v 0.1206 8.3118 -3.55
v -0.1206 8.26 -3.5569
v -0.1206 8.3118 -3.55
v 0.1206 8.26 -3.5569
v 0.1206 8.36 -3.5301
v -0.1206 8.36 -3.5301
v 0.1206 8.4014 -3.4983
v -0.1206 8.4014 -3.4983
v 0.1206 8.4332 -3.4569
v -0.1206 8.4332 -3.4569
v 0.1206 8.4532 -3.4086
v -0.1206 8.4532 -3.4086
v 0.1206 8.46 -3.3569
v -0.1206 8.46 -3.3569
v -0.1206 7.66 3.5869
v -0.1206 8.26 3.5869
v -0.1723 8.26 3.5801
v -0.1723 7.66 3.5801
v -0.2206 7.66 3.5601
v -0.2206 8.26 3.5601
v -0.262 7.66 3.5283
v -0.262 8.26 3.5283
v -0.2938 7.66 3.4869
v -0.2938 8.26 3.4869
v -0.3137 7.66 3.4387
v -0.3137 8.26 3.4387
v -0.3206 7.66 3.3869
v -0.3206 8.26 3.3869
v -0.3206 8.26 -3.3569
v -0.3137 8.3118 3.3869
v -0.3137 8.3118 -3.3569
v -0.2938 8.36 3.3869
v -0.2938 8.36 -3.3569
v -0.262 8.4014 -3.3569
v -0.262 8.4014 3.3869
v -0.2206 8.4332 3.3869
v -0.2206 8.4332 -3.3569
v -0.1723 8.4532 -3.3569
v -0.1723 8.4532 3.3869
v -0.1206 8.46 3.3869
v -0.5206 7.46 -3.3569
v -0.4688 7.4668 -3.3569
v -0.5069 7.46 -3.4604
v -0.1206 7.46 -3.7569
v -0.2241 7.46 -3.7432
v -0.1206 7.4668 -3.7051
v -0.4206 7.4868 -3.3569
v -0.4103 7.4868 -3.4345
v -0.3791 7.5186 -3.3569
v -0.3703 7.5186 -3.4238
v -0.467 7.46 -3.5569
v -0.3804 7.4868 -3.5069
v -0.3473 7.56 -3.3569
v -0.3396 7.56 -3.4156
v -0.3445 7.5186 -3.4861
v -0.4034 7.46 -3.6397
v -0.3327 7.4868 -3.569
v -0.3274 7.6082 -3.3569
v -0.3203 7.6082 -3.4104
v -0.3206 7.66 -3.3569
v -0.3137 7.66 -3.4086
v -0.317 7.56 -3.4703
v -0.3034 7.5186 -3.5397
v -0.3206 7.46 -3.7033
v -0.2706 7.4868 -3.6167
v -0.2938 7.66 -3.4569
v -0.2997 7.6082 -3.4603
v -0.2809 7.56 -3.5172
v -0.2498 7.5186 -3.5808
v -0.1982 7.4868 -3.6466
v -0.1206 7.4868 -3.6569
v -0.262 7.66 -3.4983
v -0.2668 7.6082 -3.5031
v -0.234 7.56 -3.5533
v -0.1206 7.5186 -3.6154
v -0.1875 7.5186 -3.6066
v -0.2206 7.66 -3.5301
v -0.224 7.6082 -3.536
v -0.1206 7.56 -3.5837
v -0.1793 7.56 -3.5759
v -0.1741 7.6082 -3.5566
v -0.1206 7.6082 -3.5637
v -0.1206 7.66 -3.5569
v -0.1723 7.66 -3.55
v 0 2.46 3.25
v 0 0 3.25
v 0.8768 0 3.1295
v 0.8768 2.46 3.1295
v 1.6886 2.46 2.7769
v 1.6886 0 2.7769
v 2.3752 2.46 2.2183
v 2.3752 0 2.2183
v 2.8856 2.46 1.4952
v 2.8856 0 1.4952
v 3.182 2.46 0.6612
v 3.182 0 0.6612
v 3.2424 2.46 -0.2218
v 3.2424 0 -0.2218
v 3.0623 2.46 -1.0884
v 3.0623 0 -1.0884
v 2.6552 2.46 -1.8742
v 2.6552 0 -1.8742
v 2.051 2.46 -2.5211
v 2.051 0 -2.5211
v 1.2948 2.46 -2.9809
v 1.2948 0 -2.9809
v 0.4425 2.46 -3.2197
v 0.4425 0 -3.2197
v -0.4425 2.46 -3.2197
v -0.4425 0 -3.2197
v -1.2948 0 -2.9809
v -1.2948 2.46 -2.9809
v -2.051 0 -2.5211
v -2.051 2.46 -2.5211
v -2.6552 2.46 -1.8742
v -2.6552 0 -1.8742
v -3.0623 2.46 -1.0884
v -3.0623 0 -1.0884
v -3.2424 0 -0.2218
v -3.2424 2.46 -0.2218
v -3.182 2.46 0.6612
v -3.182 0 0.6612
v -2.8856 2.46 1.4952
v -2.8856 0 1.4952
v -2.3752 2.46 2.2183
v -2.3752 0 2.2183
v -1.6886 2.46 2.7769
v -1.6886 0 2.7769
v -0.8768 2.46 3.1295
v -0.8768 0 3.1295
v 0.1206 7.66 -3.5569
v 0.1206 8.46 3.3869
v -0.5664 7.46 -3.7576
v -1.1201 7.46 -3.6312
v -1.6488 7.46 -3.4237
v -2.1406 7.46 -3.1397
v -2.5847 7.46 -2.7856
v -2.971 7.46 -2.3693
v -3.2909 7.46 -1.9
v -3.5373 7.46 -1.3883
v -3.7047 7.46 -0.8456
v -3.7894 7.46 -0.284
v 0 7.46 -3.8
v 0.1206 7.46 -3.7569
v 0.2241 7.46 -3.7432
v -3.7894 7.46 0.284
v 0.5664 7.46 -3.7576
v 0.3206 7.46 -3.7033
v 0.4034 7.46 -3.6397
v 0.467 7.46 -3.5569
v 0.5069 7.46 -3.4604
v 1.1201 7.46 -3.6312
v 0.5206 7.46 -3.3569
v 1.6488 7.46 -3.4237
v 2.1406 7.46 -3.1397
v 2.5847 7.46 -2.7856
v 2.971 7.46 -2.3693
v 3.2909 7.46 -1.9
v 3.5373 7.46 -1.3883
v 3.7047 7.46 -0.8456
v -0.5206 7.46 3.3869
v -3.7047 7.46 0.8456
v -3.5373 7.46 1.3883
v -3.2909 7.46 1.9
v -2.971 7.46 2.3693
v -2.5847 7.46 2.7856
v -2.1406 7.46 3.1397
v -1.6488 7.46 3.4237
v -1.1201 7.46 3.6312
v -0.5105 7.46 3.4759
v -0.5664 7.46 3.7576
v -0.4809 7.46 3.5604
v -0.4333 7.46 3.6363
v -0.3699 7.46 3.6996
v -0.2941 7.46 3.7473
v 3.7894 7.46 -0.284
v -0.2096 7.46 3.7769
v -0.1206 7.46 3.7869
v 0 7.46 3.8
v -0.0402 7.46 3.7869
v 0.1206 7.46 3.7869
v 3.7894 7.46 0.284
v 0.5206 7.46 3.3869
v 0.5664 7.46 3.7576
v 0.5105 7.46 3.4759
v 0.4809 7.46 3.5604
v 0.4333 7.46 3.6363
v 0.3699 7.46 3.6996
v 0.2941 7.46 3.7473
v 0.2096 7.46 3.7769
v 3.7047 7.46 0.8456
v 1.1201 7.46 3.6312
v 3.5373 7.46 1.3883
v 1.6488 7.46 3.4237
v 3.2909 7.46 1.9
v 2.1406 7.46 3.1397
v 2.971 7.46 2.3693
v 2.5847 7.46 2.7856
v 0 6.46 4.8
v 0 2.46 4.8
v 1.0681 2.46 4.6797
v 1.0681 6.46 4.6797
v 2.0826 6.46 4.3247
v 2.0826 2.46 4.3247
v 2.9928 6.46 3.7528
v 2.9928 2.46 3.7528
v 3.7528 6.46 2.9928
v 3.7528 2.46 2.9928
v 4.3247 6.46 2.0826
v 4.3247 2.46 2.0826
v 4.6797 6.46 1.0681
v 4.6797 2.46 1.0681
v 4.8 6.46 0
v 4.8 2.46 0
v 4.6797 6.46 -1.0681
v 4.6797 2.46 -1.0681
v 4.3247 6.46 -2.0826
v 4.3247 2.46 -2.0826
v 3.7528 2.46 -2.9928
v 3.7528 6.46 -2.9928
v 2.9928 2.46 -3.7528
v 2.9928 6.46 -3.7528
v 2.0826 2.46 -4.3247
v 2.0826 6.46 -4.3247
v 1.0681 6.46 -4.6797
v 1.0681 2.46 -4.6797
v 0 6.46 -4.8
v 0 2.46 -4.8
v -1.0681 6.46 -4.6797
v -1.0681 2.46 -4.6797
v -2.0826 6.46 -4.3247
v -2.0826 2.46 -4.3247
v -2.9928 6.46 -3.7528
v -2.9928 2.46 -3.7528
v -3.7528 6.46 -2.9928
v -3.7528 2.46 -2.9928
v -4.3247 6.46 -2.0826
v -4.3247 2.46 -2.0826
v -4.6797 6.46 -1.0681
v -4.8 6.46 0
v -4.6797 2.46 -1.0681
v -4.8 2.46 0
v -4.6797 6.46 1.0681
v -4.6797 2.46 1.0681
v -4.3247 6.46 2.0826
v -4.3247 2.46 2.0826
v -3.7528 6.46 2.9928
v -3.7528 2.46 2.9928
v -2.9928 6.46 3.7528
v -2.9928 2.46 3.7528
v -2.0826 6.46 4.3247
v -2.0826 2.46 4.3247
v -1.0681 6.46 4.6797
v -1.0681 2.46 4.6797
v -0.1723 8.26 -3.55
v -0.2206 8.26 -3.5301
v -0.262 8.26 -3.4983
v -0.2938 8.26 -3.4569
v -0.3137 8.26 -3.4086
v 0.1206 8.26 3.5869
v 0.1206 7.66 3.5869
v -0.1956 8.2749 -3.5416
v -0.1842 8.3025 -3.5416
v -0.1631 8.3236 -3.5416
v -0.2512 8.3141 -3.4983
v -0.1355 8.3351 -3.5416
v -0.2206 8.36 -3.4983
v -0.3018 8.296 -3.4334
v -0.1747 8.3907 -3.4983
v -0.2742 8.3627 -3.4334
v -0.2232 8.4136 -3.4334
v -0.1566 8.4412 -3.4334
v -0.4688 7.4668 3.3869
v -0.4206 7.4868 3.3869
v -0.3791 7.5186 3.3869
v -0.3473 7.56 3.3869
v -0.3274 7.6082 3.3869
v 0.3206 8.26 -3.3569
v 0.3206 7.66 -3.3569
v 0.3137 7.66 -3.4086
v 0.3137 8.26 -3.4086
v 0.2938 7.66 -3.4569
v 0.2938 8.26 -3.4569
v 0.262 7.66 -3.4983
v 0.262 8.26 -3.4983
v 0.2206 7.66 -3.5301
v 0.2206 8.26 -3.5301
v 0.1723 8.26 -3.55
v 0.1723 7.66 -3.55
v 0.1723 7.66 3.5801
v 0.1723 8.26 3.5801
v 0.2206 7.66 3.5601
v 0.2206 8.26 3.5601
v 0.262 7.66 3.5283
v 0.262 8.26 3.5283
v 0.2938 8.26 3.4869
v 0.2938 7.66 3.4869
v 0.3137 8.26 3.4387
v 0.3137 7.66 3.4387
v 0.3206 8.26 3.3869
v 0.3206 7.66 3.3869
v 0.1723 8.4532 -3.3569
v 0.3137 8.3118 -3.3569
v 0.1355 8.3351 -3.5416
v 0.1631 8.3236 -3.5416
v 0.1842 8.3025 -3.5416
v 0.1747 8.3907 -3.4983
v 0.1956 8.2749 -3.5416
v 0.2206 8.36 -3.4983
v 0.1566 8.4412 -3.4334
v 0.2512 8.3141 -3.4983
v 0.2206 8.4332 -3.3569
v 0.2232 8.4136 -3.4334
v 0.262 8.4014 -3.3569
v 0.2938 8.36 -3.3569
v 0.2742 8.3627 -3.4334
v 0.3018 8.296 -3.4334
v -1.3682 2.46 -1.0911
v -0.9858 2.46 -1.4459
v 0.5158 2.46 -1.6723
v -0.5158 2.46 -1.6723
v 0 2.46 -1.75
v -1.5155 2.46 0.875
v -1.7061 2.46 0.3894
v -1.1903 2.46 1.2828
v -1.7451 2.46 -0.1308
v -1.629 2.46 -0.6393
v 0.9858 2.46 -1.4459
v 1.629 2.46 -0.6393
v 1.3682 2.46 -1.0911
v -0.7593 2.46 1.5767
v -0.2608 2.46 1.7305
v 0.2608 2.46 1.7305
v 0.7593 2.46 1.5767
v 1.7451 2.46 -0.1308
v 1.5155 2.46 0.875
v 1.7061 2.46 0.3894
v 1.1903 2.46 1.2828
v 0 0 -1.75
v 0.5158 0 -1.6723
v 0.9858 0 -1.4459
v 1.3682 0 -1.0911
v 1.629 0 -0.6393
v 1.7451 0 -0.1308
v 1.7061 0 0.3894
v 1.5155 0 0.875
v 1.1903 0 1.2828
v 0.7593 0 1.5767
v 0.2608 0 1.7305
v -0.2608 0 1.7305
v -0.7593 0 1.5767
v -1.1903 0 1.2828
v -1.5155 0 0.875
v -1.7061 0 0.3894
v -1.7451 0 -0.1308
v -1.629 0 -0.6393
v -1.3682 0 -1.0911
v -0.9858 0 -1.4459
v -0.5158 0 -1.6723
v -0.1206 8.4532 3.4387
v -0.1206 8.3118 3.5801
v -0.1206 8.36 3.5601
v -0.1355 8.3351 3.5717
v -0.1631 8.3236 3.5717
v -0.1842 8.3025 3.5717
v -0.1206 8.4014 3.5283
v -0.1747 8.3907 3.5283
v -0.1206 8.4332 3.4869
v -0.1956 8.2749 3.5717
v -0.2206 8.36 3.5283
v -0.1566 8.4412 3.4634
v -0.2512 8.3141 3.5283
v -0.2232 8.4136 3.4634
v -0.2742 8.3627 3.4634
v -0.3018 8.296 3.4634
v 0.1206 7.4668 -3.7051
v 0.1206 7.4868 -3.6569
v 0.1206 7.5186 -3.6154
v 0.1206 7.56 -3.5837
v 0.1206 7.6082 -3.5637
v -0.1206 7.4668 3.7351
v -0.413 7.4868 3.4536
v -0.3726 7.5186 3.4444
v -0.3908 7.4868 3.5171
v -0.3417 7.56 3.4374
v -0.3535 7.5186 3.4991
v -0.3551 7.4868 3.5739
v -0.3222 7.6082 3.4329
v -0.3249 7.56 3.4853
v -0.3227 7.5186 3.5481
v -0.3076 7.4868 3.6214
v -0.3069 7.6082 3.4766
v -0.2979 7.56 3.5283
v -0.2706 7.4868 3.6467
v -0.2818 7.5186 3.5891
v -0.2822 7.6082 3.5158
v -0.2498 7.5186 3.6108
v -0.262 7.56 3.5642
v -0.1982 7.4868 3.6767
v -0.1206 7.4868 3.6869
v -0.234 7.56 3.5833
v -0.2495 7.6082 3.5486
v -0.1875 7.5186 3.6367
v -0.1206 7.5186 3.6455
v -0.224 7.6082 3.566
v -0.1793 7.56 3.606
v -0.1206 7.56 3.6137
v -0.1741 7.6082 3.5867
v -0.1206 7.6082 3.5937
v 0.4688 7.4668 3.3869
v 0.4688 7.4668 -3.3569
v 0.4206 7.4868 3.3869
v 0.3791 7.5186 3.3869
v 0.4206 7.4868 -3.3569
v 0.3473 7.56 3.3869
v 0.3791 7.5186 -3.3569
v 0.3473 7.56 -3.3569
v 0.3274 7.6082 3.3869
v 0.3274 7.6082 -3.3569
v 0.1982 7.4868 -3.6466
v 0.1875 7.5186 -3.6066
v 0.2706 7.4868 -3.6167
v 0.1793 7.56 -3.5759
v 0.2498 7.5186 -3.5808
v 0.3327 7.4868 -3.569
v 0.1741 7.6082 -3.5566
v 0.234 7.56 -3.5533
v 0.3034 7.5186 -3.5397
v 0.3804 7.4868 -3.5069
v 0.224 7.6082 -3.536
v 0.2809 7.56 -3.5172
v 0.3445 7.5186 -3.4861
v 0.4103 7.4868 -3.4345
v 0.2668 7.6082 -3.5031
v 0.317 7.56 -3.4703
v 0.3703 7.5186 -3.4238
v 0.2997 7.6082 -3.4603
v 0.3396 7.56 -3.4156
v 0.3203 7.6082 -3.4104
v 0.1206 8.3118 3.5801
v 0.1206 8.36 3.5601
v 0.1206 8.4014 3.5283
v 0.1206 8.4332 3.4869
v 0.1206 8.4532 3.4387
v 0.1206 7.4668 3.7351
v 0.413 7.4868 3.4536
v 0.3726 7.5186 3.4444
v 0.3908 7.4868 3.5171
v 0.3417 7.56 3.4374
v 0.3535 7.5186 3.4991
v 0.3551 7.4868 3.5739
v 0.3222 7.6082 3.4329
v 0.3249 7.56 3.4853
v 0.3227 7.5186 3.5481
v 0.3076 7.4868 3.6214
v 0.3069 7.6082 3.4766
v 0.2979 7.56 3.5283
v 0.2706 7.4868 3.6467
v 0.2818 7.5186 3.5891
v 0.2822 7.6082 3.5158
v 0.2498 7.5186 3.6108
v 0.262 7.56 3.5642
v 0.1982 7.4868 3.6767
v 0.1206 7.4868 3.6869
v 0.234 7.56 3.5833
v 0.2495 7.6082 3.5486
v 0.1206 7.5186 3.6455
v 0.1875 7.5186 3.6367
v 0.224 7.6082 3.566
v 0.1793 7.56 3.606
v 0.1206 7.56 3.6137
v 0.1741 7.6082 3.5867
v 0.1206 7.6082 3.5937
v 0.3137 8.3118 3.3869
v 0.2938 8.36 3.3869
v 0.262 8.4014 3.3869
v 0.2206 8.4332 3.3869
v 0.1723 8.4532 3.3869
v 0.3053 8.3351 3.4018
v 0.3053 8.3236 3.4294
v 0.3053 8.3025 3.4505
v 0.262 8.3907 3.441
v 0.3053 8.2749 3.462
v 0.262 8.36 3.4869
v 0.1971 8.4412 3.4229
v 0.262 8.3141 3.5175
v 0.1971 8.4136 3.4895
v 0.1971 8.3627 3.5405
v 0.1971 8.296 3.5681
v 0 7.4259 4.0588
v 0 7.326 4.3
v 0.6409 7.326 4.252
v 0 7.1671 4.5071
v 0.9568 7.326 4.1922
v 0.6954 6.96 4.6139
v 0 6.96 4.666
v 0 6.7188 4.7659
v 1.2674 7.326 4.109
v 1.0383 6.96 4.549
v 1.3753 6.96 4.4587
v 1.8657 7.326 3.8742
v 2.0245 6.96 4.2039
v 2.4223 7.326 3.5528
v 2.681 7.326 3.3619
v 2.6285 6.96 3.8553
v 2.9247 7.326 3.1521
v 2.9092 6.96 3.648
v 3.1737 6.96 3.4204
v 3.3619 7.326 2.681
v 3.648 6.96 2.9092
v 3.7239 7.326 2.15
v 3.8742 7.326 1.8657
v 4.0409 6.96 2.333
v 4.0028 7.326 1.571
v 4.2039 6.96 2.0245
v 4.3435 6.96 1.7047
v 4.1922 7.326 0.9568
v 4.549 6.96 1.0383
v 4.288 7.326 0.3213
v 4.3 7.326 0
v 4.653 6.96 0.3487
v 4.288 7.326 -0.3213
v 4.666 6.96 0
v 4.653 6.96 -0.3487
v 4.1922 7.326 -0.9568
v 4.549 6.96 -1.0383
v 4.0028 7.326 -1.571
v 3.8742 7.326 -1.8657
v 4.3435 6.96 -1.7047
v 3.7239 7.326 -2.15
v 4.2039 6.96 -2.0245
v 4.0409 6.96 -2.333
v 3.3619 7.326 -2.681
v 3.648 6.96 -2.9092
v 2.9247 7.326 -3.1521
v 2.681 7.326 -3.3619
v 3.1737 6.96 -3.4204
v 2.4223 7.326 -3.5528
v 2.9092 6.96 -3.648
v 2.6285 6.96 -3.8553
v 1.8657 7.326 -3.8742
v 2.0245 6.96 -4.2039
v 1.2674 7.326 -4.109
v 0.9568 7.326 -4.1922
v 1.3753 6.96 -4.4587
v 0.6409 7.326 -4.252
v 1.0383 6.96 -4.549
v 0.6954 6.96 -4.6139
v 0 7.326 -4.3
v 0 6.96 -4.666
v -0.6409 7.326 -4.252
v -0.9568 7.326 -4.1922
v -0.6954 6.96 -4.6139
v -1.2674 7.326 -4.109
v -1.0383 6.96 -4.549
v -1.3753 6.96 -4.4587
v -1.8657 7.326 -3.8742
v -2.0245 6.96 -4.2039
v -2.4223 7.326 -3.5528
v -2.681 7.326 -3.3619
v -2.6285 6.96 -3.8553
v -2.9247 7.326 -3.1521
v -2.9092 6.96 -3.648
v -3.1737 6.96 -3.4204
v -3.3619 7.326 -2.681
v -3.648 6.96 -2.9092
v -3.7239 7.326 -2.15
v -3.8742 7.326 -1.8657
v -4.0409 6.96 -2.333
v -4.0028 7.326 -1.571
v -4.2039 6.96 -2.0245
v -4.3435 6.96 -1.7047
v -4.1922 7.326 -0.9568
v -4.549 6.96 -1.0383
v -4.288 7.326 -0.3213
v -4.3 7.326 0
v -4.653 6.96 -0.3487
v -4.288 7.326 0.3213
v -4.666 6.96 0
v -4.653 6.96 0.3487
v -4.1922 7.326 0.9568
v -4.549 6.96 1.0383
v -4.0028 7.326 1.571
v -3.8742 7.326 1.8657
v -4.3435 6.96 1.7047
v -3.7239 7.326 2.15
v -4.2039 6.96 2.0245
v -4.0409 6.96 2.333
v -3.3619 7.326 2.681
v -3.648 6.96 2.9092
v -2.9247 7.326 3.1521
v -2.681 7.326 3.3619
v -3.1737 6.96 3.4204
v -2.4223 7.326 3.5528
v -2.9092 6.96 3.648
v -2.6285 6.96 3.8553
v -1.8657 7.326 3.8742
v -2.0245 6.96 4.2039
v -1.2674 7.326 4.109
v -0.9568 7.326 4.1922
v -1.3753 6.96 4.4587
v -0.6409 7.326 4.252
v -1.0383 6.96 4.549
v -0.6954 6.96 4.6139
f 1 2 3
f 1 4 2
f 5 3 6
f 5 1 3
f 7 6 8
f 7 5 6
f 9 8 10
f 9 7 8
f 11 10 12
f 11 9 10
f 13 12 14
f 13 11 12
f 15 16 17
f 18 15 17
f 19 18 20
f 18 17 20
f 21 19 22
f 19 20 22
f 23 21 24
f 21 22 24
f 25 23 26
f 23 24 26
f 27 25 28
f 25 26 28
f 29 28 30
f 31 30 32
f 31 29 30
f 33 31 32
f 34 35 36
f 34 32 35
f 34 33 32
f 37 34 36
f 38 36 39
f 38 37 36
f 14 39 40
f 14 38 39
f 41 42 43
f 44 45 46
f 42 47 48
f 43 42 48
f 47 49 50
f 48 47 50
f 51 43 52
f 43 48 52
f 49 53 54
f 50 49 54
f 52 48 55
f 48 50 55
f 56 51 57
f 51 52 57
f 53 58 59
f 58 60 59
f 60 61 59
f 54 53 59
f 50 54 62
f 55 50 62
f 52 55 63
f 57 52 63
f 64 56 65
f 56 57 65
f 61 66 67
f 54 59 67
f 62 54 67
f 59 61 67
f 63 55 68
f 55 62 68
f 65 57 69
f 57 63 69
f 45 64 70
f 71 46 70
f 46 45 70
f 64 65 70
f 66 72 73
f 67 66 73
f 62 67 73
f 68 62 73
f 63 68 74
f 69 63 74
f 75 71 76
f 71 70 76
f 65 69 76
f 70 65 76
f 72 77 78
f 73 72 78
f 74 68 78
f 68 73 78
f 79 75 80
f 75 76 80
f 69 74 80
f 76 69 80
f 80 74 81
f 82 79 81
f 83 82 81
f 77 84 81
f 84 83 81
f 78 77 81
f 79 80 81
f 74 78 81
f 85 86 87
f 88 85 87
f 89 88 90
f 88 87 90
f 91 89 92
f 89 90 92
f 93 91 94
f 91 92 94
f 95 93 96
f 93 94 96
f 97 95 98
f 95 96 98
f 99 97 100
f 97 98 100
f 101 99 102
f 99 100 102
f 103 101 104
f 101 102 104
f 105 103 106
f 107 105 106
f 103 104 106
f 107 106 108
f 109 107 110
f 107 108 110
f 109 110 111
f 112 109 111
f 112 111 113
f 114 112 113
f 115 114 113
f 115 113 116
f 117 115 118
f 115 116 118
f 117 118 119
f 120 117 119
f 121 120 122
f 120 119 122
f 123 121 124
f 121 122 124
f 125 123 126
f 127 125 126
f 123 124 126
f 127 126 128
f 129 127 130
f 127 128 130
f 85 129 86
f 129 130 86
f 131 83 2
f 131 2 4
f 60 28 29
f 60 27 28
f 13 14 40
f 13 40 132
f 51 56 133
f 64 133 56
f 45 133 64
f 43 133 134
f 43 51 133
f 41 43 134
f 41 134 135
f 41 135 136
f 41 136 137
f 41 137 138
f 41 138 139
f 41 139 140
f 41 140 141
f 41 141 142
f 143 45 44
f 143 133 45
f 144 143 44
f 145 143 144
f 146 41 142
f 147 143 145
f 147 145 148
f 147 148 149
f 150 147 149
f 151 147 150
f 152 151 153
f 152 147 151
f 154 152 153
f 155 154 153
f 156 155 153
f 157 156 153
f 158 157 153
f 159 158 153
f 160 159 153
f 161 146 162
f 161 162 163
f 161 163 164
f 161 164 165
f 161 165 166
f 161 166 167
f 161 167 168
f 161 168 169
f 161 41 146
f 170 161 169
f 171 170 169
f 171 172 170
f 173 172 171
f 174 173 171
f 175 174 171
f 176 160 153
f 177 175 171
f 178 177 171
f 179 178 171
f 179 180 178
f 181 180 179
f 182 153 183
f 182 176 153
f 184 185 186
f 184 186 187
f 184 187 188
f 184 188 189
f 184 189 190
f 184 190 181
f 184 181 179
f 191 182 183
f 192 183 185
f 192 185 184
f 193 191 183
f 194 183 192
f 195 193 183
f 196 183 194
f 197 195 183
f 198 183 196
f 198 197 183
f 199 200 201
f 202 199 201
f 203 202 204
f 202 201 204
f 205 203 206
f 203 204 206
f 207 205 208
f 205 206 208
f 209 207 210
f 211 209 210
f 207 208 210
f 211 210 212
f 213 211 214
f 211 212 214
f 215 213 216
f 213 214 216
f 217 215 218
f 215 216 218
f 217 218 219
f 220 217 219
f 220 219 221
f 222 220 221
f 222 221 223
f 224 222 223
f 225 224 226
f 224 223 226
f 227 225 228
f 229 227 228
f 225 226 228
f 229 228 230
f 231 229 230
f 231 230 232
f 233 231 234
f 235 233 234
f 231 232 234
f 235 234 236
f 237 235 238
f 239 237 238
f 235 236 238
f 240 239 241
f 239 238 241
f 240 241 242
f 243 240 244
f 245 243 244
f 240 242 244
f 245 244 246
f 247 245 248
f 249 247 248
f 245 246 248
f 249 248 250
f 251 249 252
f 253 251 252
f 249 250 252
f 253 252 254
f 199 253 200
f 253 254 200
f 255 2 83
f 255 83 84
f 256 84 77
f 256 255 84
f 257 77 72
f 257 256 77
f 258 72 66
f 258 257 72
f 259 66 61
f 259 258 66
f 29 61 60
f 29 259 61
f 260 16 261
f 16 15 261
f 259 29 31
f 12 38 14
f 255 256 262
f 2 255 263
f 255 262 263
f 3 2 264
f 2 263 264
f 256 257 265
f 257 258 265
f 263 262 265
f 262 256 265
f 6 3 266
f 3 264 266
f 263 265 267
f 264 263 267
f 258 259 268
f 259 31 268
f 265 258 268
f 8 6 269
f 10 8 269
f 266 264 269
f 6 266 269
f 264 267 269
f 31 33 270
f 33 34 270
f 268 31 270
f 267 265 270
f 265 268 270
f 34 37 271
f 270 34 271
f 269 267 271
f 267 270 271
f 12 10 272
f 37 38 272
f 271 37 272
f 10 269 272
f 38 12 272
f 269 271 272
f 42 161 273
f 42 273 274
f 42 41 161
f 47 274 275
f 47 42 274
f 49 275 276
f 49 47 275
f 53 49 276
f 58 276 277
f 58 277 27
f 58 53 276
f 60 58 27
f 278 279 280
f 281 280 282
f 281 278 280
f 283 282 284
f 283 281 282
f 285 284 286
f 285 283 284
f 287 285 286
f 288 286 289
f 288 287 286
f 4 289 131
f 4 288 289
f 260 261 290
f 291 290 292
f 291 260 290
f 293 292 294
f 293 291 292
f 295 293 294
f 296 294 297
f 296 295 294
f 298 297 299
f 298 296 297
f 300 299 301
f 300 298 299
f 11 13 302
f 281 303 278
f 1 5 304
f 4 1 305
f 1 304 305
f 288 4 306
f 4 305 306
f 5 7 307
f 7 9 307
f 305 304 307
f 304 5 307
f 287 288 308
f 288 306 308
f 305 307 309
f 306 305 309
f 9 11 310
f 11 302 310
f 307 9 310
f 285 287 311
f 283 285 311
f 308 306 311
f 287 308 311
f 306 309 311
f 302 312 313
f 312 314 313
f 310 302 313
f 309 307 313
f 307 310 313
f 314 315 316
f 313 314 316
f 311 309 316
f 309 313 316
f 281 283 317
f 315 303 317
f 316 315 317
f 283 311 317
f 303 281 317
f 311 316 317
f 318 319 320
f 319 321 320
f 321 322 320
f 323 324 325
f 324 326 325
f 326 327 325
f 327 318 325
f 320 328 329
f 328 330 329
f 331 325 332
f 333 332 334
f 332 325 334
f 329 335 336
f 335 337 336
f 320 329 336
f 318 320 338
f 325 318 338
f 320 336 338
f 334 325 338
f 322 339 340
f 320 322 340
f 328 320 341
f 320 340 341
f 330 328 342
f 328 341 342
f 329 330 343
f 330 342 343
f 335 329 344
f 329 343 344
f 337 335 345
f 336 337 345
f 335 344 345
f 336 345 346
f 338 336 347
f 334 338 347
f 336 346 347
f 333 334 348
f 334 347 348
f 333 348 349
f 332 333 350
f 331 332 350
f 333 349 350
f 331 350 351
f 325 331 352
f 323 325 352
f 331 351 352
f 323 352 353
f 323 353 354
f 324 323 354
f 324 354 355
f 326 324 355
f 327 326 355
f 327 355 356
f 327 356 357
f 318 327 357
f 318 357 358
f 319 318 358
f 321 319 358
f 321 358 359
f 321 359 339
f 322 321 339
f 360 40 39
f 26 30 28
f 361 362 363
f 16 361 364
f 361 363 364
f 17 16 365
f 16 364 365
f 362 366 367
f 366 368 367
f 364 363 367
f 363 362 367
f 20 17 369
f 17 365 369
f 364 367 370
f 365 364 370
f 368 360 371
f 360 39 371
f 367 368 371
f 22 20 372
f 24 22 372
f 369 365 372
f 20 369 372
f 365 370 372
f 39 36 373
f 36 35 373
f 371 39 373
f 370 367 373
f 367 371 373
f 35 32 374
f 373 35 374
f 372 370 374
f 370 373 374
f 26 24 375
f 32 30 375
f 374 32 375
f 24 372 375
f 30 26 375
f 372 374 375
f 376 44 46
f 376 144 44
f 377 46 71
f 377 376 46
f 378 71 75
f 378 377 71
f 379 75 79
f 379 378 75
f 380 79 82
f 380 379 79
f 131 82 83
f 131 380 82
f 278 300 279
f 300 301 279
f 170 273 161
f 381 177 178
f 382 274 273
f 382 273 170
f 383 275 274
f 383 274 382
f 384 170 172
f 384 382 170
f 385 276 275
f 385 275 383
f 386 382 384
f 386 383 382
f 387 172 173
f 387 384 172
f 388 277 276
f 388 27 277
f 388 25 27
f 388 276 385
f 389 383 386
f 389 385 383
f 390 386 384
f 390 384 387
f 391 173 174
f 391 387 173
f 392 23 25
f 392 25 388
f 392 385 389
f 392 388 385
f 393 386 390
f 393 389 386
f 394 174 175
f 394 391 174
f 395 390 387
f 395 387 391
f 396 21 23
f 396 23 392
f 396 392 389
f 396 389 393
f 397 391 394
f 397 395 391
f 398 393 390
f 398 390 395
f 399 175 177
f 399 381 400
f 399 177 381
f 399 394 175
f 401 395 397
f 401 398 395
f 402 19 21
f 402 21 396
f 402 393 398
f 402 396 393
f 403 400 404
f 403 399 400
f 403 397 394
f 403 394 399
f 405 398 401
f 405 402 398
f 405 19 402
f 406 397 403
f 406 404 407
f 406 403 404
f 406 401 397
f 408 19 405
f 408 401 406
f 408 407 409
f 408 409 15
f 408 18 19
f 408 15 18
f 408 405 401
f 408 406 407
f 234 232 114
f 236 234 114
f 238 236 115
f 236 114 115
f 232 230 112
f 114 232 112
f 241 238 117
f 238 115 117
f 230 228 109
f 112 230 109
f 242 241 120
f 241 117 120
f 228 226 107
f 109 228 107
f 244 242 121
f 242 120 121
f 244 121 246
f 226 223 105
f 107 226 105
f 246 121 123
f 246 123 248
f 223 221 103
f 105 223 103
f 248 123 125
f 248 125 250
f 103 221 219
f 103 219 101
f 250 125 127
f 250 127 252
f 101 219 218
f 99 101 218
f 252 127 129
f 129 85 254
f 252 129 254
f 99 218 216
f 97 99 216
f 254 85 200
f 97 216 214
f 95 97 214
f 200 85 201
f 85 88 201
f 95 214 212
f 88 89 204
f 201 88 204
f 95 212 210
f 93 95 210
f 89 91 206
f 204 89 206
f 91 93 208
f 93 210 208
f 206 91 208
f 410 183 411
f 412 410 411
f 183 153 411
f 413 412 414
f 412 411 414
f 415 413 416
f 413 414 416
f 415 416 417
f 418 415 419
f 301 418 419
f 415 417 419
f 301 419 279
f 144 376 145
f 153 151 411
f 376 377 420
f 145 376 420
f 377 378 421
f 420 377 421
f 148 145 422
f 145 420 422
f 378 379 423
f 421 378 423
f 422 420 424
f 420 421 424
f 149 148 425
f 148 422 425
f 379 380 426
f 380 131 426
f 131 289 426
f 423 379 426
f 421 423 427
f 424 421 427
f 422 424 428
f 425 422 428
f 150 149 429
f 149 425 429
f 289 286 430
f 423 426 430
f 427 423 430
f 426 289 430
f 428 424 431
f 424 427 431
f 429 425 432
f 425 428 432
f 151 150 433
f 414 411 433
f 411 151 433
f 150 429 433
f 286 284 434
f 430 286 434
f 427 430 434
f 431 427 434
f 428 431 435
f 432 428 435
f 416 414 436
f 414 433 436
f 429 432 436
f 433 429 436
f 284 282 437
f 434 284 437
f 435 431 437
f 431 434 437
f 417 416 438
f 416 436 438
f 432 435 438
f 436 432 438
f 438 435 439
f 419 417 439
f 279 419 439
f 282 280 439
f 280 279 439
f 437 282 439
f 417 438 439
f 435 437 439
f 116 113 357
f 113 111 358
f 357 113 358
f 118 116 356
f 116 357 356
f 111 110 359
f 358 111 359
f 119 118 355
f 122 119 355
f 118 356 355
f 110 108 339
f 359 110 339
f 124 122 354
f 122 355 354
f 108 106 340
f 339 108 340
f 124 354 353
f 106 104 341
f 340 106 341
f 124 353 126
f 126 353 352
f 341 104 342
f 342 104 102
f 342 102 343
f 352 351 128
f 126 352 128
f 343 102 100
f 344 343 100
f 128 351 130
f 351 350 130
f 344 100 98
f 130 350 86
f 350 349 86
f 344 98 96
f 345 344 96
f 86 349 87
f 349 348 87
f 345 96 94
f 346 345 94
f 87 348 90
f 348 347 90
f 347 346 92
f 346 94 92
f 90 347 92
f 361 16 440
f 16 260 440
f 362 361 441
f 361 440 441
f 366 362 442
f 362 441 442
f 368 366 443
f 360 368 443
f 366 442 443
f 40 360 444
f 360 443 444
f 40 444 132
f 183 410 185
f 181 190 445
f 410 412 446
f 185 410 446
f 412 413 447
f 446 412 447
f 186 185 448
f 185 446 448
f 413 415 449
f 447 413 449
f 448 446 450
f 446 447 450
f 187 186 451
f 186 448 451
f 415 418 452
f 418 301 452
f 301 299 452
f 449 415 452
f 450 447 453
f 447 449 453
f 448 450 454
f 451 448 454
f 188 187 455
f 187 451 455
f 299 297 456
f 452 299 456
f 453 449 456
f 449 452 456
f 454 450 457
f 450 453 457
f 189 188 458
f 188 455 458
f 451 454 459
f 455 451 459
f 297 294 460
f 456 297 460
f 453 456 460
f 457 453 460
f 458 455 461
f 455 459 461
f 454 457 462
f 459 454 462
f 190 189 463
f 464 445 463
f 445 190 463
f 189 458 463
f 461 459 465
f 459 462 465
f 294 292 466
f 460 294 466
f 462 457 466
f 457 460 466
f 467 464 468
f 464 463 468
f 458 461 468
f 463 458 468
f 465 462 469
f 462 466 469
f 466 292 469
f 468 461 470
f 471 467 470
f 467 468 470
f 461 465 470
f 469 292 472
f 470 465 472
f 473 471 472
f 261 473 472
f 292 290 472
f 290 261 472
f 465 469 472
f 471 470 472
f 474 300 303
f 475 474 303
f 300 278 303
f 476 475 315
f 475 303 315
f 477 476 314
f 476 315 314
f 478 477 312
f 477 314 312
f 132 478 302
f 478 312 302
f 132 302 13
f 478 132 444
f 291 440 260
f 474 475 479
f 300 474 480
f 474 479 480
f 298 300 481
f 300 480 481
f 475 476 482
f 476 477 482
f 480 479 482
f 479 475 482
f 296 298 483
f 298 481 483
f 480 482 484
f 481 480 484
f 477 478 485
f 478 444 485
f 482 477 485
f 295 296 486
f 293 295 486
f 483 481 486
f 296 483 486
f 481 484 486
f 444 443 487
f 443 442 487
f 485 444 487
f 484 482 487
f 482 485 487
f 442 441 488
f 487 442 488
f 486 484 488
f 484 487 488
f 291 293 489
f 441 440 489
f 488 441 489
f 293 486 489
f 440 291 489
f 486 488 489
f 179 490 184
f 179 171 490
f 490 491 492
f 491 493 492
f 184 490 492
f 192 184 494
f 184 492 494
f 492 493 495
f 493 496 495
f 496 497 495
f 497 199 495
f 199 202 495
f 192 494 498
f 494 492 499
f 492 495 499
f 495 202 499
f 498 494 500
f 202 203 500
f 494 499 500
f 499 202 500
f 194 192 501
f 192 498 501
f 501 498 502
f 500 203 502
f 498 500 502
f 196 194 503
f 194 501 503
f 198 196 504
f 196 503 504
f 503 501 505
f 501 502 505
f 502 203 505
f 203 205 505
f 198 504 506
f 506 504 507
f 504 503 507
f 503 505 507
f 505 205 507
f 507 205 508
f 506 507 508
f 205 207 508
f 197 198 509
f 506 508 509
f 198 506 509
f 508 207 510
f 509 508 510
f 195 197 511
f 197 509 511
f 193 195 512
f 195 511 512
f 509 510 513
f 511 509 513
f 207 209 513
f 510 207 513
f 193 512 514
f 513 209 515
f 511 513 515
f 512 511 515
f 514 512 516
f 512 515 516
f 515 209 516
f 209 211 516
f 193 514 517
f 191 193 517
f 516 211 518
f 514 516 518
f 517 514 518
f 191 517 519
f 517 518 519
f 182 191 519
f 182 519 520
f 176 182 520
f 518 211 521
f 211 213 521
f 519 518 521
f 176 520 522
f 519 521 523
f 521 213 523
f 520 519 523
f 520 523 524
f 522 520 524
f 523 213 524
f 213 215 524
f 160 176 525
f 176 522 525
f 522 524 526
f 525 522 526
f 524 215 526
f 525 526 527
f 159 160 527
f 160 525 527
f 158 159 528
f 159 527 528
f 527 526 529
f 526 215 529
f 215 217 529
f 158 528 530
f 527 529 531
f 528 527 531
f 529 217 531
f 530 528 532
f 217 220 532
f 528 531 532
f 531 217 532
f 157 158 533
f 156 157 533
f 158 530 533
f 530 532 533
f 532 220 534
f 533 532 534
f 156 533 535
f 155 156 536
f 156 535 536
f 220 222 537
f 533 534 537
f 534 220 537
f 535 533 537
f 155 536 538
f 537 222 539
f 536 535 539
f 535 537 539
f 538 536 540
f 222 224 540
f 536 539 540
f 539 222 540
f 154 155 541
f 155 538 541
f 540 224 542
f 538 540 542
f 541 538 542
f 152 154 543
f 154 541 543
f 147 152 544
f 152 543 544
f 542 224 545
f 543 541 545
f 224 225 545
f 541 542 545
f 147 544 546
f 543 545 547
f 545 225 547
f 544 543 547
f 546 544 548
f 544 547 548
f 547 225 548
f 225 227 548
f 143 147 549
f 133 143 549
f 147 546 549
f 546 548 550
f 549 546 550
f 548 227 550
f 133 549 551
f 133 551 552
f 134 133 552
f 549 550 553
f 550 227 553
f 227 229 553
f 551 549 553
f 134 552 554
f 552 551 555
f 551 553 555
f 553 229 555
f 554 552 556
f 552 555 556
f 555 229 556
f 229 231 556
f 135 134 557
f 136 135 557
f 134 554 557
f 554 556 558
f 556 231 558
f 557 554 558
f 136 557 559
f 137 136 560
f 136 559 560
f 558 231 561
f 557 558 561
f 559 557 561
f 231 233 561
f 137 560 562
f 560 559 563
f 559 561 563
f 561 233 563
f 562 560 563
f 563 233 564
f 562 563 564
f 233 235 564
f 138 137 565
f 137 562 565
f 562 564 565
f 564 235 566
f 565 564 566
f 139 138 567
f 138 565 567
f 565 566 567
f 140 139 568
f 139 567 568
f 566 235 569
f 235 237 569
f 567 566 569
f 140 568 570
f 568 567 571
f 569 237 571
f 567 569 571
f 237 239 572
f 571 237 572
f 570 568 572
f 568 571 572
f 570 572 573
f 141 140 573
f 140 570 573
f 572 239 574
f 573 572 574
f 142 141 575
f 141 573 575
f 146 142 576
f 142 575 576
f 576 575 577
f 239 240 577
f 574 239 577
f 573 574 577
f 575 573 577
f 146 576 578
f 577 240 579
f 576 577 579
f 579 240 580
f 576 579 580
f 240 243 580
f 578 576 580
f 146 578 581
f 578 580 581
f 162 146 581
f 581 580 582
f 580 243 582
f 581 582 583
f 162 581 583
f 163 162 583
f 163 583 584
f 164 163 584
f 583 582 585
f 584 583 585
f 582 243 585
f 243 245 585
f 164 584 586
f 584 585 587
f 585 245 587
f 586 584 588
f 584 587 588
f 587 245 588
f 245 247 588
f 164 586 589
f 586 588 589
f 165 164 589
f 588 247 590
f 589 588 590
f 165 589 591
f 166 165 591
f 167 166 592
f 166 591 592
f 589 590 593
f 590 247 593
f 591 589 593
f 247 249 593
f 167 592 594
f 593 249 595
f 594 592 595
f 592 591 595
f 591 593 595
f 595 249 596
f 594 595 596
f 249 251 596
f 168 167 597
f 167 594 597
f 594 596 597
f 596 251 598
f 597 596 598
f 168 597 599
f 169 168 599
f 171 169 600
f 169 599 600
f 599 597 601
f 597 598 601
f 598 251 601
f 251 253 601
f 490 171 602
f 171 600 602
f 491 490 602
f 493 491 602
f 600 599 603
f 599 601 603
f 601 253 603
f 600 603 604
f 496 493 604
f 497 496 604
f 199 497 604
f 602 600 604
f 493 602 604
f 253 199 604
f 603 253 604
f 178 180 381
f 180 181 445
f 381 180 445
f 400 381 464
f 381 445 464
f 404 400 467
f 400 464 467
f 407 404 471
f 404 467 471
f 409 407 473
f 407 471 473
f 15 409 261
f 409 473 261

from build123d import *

# Parameters (mm, degrees)
SKETCH1_R           = 3.25
BOSS_EXTRUDE1_DEPTH = 2.46
SKETCH2_R           = 1.75
CUT_EXTRUDE1_DEPTH  = 2.5
SKETCH6_R           = 4.8
BOSS_EXTRUDE2_DEPTH = 5
SKETCH11_W          = 0.64110577
SKETCH11_H          = 7.14375
BOSS_EXTRUDE4_DEPTH = 1
FILLET1_R           = 0.2
FILLET2_R           = 1


with BuildPart() as part:
    # Sketch1 → Boss-Extrude1 (new body)
    with BuildSketch(Plane(origin=(0, 0, 0), x_dir=(1, 0, 0), z_dir=(0, 1, 0))):
        with Locations(Location((0, 0, 0), (0, 0, 270))):
            Circle(SKETCH1_R)
    extrude(amount=BOSS_EXTRUDE1_DEPTH)

    # Sketch2 → Cut-Extrude1 (cut)
    with BuildSketch(Plane.XZ):
        with Locations(Location((0, 0, 0), (0, 0, 270))):
            Circle(SKETCH2_R)
    extrude(amount=-CUT_EXTRUDE1_DEPTH, mode=Mode.SUBTRACT)

    # Sketch6 → Boss-Extrude2 (add)
    with BuildSketch(Plane(origin=(0, 2.46, 0), x_dir=(1, 0, 0), z_dir=(0, 1, 0))):
        with Locations(Location((0, 0, 0), (0, 0, 270))):
            Circle(SKETCH6_R)
    extrude(amount=BOSS_EXTRUDE2_DEPTH)

    # Sketch11 → Boss-Extrude4 (add)
    with BuildSketch(Plane(origin=(0, 7.46, 0), x_dir=(1, 0, 0), z_dir=(0, 1, 0))):
        with Locations((0, -0.015014366)):
            Rectangle(SKETCH11_W, SKETCH11_H)
    extrude(amount=BOSS_EXTRUDE4_DEPTH)

    # Fillet1
    fillet1_edges = [part.edges().sort_by_distance(p)[0] for p in [
        (-0.320552885, 8.46, 0.015014366),
        (-0.320552885, 7.96, -3.556860634),
        (0, 8.46, 3.586889366),
        (-0.320552885, 7.96, 3.586889366),
        (0.320552885, 8.46, 0.015014366),
        (0.320552885, 7.96, 3.586889366),
        (0, 8.46, -3.556860634),
        (0.320552885, 7.96, -3.556860634),
        (-0.320552885, 7.46, 0.015014366),
        (0, 7.46, -3.556860634),
        (0.320552885, 7.46, 0.015014366),
        (0, 7.46, 3.586889366),
    ]]
    fillet(fillet1_edges, radius=FILLET1_R)

    # Fillet2
    fillet2_edges = [part.edges().sort_by_distance(p)[0] for p in [
        (0, 7.46, -4.8),
    ]]
    fillet(fillet2_edges, radius=FILLET2_R)


solid = part.part
